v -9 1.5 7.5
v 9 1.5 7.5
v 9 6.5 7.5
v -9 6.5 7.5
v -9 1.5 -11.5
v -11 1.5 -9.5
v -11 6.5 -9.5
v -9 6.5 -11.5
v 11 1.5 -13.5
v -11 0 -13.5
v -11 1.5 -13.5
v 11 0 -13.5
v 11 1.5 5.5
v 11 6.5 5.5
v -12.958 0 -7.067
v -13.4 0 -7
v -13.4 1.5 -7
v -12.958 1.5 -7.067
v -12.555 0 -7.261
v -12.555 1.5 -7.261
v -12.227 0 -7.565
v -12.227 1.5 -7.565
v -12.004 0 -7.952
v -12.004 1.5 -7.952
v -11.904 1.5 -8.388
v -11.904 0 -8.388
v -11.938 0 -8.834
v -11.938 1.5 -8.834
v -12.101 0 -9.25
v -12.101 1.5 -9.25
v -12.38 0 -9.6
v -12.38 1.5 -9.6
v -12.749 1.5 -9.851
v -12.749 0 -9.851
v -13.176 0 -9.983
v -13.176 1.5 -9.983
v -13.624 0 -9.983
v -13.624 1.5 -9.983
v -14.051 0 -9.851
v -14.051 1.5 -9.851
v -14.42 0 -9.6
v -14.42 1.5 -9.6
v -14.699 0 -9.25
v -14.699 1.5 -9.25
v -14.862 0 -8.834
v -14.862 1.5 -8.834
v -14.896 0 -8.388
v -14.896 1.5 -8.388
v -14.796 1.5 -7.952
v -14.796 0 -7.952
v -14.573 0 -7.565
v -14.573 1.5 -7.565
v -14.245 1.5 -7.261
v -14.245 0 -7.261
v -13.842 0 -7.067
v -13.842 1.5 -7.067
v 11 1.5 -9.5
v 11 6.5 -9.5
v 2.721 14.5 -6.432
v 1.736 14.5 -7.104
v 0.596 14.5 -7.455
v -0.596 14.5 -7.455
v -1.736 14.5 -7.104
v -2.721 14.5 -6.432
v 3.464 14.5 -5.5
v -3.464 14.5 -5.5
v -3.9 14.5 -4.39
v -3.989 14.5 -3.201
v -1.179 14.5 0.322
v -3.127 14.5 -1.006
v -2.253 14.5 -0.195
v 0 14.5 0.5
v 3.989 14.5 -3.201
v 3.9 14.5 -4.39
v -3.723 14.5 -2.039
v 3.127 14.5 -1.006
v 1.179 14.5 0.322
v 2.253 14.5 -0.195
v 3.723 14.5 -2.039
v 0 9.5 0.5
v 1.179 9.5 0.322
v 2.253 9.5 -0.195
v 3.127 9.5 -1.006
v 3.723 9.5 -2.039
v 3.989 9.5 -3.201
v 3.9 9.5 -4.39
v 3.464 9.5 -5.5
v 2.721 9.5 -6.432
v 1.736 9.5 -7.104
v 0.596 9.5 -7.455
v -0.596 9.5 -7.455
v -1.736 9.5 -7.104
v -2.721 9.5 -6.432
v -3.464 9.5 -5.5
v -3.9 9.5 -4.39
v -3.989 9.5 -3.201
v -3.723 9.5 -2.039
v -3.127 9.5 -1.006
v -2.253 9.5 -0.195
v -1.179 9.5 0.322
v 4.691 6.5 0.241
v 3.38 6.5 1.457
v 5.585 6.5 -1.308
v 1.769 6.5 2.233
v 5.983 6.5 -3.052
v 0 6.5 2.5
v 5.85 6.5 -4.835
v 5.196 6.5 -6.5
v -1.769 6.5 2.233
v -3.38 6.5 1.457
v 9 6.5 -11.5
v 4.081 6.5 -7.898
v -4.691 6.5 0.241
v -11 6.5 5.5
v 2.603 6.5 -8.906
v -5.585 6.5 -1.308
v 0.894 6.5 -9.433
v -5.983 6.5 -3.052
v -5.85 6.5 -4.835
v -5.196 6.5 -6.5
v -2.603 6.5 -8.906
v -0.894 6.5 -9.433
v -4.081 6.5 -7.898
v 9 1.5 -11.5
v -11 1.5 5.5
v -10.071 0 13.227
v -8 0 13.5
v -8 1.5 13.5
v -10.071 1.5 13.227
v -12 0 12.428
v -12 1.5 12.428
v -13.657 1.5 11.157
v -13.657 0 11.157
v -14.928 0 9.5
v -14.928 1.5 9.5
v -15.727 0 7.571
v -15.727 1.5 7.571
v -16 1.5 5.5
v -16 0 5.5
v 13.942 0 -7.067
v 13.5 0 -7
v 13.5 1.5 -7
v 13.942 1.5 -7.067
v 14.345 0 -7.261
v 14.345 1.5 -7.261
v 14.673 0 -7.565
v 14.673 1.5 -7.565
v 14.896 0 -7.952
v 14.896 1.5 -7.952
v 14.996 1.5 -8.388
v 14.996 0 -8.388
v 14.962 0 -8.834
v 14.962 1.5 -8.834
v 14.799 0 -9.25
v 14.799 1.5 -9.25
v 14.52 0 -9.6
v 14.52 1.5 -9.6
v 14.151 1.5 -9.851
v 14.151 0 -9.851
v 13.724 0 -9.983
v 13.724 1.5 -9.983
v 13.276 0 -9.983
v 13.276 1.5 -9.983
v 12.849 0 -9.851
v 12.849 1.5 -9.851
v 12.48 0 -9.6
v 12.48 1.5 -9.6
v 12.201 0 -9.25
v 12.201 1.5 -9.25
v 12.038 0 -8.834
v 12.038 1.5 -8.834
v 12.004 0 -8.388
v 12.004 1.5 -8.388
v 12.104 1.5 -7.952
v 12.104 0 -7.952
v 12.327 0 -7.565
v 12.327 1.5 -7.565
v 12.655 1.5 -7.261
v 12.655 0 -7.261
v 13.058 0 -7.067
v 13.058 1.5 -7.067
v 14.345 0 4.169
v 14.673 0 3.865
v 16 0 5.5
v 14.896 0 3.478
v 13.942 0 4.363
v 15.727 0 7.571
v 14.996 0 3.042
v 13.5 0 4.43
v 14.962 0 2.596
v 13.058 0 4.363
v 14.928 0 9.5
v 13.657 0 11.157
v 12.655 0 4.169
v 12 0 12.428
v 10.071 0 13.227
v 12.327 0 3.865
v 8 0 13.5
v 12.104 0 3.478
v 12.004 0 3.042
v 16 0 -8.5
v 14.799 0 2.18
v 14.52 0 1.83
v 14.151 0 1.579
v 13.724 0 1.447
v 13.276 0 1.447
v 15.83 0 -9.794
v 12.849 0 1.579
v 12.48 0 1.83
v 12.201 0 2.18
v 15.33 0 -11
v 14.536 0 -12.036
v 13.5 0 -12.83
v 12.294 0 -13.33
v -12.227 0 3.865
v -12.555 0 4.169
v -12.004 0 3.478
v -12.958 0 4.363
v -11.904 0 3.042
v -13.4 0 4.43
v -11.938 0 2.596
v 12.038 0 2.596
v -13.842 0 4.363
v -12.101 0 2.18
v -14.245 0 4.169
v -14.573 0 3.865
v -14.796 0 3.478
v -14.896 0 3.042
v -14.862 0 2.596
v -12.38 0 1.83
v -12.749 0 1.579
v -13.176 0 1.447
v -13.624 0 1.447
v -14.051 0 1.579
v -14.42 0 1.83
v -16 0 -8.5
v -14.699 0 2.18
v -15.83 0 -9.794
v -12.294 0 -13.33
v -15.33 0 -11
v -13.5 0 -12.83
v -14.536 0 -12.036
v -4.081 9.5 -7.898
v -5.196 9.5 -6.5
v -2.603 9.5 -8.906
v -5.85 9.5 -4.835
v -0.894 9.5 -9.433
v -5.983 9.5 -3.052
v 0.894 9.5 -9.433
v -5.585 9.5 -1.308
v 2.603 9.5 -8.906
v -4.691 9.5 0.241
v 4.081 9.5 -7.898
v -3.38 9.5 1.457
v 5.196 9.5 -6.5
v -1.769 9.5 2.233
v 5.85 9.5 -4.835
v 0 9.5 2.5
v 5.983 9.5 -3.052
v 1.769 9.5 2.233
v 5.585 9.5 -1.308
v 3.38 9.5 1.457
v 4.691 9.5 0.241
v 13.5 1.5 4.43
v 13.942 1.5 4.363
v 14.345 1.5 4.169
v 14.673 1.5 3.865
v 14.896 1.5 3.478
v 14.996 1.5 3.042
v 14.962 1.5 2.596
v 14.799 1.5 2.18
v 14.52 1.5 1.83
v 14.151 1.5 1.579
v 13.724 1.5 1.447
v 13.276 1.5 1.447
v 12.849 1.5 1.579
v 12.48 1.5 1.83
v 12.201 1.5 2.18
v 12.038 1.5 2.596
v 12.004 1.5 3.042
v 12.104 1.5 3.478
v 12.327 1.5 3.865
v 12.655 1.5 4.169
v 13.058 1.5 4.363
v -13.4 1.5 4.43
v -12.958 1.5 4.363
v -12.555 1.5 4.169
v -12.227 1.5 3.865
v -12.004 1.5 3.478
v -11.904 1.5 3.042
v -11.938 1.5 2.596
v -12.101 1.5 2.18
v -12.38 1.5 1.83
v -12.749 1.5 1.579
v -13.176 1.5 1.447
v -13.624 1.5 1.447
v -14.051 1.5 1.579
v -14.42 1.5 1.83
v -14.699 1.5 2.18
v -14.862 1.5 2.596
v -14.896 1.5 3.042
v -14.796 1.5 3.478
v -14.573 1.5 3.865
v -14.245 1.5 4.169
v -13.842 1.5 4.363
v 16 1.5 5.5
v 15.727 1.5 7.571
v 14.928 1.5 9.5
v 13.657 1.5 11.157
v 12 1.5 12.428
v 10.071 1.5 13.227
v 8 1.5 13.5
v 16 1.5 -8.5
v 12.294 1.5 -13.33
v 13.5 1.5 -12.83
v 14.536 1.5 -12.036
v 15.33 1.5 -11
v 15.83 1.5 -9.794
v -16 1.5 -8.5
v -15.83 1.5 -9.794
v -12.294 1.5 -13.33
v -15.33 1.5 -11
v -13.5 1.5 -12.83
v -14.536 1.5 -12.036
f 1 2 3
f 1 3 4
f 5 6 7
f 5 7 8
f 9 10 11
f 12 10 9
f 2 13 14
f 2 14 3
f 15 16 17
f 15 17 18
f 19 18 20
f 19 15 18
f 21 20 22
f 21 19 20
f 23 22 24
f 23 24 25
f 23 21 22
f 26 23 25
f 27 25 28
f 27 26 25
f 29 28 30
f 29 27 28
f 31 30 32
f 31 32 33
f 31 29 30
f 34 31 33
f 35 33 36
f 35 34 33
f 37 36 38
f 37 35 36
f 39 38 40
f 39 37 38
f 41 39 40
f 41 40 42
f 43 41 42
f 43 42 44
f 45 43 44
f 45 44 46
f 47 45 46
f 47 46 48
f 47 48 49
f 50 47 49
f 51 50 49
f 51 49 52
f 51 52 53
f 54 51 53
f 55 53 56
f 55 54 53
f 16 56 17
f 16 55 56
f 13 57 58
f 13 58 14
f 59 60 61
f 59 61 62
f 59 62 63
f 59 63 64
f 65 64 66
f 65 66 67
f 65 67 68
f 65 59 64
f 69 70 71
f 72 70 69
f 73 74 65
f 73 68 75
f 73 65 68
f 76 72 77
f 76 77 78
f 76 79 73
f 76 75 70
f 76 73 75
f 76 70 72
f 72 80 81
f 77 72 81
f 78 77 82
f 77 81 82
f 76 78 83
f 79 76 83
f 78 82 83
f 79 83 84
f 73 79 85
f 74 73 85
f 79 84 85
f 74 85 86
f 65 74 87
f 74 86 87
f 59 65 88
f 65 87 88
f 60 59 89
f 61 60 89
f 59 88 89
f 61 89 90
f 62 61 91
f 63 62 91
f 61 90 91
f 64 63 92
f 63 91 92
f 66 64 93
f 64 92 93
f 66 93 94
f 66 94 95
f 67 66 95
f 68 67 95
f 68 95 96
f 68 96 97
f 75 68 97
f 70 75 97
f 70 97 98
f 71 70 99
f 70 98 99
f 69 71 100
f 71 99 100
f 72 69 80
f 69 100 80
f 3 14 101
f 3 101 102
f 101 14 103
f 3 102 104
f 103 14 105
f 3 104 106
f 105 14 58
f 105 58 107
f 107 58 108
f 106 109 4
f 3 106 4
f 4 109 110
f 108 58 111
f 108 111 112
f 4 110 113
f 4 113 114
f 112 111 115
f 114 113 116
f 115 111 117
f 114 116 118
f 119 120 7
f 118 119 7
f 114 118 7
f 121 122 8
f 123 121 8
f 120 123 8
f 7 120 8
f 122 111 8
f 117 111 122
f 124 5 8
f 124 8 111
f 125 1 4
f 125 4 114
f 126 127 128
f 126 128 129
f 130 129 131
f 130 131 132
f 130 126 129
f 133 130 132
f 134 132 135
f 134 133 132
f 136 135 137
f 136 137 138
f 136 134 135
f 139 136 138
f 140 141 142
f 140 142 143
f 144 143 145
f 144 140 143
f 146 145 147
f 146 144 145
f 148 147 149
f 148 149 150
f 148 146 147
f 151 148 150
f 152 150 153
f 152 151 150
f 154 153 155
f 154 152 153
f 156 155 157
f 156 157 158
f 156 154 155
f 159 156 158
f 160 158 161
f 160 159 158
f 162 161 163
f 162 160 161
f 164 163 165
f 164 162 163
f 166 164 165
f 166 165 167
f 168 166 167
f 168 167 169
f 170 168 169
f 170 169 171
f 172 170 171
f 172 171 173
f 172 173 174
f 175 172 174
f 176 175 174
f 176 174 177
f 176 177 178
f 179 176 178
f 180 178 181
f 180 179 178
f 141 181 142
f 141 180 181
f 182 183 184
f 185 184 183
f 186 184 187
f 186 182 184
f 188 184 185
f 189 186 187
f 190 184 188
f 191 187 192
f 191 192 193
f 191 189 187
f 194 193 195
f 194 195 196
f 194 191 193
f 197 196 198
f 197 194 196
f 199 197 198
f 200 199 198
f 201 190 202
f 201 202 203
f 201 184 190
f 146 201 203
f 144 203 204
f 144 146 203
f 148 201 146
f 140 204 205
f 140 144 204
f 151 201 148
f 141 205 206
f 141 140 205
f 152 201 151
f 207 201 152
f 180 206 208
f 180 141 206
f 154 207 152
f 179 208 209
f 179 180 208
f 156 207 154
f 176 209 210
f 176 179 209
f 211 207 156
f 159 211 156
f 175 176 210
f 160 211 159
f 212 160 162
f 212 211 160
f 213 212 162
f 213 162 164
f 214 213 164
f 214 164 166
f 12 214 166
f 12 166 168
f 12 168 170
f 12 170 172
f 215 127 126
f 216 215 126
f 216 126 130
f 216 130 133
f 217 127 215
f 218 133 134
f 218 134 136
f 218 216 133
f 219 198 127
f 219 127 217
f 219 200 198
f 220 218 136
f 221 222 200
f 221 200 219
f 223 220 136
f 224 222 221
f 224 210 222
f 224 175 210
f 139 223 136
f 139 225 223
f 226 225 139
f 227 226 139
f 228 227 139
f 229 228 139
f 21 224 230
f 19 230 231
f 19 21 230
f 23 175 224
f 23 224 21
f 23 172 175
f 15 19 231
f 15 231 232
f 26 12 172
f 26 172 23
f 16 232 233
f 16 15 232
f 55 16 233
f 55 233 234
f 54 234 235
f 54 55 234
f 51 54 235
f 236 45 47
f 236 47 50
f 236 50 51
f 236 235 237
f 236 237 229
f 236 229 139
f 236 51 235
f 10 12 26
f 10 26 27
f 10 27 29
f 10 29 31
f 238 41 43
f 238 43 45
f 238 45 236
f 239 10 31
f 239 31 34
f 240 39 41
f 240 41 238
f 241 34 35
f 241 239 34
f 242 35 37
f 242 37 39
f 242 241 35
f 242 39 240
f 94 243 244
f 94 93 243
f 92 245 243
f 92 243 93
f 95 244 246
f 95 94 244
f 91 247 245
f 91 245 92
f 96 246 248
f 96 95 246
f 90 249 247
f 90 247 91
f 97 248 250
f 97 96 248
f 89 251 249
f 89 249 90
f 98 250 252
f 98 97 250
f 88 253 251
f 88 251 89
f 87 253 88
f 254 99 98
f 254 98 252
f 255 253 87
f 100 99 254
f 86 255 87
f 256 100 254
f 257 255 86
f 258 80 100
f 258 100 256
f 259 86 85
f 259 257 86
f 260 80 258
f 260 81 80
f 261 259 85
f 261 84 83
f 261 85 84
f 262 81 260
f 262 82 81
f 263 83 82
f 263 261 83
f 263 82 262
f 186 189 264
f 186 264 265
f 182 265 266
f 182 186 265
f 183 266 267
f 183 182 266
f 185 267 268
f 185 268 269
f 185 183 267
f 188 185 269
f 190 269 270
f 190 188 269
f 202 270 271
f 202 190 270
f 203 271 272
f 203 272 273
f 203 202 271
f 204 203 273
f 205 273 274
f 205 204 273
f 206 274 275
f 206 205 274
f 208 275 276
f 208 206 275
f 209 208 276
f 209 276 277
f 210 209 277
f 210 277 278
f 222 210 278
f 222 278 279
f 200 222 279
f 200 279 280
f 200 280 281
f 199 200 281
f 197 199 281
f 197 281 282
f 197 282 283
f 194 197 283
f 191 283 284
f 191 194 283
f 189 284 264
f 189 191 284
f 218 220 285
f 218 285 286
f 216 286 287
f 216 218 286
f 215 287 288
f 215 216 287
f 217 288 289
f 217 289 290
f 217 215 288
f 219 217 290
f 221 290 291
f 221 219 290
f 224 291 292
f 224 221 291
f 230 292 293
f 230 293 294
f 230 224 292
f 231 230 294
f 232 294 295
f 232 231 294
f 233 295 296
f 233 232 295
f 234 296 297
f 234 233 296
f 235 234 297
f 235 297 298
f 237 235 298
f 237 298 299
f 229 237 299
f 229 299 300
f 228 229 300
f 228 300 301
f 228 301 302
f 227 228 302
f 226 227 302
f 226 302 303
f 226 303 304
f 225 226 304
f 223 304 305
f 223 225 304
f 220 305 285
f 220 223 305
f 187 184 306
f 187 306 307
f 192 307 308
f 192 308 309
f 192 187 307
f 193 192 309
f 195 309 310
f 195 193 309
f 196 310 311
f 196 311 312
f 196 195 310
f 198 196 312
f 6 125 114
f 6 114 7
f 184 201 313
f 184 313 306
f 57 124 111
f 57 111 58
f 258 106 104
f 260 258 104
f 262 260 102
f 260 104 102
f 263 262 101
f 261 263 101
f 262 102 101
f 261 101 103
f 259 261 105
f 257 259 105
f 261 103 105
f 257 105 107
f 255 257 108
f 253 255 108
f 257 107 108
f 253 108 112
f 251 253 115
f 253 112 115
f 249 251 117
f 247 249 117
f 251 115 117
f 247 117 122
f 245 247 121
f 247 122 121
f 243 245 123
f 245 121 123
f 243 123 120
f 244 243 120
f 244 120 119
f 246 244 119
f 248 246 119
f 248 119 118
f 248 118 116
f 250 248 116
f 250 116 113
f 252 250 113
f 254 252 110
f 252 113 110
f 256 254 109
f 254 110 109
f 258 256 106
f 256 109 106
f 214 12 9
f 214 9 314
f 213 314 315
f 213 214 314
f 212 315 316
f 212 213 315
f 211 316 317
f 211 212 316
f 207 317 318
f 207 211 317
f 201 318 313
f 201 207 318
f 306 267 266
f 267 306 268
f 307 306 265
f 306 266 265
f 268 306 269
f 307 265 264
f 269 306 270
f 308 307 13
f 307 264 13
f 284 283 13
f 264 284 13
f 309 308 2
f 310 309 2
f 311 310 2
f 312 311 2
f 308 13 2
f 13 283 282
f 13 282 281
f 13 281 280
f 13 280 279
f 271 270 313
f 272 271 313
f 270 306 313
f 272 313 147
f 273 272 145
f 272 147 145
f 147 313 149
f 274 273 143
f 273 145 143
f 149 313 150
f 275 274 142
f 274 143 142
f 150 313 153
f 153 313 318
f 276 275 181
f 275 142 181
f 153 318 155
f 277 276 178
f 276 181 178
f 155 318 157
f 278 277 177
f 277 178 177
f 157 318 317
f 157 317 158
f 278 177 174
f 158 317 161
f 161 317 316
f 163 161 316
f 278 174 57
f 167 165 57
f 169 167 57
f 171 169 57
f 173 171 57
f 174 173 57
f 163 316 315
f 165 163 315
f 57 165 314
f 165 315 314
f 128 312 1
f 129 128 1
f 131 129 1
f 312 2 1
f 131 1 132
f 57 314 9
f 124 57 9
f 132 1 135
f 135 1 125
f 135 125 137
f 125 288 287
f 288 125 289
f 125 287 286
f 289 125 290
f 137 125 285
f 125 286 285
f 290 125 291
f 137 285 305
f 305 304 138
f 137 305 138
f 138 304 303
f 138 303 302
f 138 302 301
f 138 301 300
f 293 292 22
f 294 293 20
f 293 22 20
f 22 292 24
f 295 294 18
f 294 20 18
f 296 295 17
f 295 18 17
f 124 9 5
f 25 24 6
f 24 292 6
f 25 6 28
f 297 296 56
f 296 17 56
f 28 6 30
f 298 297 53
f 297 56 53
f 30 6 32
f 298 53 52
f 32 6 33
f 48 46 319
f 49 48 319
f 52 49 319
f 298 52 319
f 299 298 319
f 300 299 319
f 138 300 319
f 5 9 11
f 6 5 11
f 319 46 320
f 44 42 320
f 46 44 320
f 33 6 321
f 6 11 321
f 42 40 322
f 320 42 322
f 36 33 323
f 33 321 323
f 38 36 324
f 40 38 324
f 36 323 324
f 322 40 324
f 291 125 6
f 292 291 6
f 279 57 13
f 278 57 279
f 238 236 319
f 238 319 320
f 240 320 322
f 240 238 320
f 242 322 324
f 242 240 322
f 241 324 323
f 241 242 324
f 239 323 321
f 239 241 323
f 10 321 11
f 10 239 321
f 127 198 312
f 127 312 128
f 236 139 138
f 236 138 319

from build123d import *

# Parameters (mm, degrees)
SKETCH_1_R      = 1.5
EXTRUDE_1_DEPTH = 1.5
EXTRUDE_2_DEPTH = 5
SKETCH_3_R      = 6
EXTRUDE_3_DEPTH = 3
SKETCH_4_R      = 4
EXTRUDE_4_DEPTH = 5


with BuildPart() as part:
    # 草图1 → 凸台-拉伸1 (new body)
    with BuildSketch(Plane(origin=(0, 0, 0), x_dir=(1, 0, 0), z_dir=(0, 1, 0))):
        with BuildLine():
            Line((-11, 13.5), (11, 13.5))
            ThreePointArc((11, 13.5), (14.535533906, 12.035533906), (16, 8.5))
            Line((16, 8.5), (16, -5.5))
            ThreePointArc((16, -5.5), (13.656854249, -11.156854249), (8, -13.5))
            Line((8, -13.5), (-8, -13.5))
            ThreePointArc((-8, -13.5), (-13.656854249, -11.156854249), (-16, -5.5))
            Line((-16, -5.5), (-16, 8.5))
            ThreePointArc((-16, 8.5), (-14.535533906, 12.035533906), (-11, 13.5))
        make_face()
        with Locations(Location((-13.4, 8.5, 0), (0, 0, 270))):
            Circle(SKETCH_1_R, mode=Mode.SUBTRACT)
        with Locations(Location((13.5, 8.5, 0), (0, 0, 270))):
            Circle(SKETCH_1_R, mode=Mode.SUBTRACT)
        with Locations(Location((-13.4, -2.93, 0), (0, 0, 270))):
            Circle(SKETCH_1_R, mode=Mode.SUBTRACT)
        with Locations(Location((13.5, -2.93, 0), (0, 0, 270))):
            Circle(SKETCH_1_R, mode=Mode.SUBTRACT)
    extrude(amount=EXTRUDE_1_DEPTH)

    # 草图2 → 凸台-拉伸2 (add)
    with BuildSketch(Plane(origin=(0, 1.5, 0), x_dir=(1, 0, 0), z_dir=(0, 1, 0))):
        Polygon((-9, 11.5), (9, 11.5), (11, 9.5), (11, -5.5), (9, -7.5), (-9, -7.5), (-11, -5.5), (-11, 9.5), align=None)
    extrude(amount=EXTRUDE_2_DEPTH)

    # 草图3 → 凸台-拉伸3 (add)
    with BuildSketch(Plane(origin=(0, 6.5, 0), x_dir=(1, 0, 0), z_dir=(0, 1, 0))):
        with Locations(Location((0, 3.5, 0), (0, 0, 270))):
            Circle(SKETCH_3_R)
    extrude(amount=EXTRUDE_3_DEPTH)

    # 草图4 → 凸台-拉伸4 (add)
    with BuildSketch(Plane(origin=(0, 9.5, 0), x_dir=(1, 0, 0), z_dir=(0, 1, 0))):
        with Locations(Location((0, 3.5, 0), (0, 0, 270))):
            Circle(SKETCH_4_R)
    extrude(amount=EXTRUDE_4_DEPTH)


solid = part.part
